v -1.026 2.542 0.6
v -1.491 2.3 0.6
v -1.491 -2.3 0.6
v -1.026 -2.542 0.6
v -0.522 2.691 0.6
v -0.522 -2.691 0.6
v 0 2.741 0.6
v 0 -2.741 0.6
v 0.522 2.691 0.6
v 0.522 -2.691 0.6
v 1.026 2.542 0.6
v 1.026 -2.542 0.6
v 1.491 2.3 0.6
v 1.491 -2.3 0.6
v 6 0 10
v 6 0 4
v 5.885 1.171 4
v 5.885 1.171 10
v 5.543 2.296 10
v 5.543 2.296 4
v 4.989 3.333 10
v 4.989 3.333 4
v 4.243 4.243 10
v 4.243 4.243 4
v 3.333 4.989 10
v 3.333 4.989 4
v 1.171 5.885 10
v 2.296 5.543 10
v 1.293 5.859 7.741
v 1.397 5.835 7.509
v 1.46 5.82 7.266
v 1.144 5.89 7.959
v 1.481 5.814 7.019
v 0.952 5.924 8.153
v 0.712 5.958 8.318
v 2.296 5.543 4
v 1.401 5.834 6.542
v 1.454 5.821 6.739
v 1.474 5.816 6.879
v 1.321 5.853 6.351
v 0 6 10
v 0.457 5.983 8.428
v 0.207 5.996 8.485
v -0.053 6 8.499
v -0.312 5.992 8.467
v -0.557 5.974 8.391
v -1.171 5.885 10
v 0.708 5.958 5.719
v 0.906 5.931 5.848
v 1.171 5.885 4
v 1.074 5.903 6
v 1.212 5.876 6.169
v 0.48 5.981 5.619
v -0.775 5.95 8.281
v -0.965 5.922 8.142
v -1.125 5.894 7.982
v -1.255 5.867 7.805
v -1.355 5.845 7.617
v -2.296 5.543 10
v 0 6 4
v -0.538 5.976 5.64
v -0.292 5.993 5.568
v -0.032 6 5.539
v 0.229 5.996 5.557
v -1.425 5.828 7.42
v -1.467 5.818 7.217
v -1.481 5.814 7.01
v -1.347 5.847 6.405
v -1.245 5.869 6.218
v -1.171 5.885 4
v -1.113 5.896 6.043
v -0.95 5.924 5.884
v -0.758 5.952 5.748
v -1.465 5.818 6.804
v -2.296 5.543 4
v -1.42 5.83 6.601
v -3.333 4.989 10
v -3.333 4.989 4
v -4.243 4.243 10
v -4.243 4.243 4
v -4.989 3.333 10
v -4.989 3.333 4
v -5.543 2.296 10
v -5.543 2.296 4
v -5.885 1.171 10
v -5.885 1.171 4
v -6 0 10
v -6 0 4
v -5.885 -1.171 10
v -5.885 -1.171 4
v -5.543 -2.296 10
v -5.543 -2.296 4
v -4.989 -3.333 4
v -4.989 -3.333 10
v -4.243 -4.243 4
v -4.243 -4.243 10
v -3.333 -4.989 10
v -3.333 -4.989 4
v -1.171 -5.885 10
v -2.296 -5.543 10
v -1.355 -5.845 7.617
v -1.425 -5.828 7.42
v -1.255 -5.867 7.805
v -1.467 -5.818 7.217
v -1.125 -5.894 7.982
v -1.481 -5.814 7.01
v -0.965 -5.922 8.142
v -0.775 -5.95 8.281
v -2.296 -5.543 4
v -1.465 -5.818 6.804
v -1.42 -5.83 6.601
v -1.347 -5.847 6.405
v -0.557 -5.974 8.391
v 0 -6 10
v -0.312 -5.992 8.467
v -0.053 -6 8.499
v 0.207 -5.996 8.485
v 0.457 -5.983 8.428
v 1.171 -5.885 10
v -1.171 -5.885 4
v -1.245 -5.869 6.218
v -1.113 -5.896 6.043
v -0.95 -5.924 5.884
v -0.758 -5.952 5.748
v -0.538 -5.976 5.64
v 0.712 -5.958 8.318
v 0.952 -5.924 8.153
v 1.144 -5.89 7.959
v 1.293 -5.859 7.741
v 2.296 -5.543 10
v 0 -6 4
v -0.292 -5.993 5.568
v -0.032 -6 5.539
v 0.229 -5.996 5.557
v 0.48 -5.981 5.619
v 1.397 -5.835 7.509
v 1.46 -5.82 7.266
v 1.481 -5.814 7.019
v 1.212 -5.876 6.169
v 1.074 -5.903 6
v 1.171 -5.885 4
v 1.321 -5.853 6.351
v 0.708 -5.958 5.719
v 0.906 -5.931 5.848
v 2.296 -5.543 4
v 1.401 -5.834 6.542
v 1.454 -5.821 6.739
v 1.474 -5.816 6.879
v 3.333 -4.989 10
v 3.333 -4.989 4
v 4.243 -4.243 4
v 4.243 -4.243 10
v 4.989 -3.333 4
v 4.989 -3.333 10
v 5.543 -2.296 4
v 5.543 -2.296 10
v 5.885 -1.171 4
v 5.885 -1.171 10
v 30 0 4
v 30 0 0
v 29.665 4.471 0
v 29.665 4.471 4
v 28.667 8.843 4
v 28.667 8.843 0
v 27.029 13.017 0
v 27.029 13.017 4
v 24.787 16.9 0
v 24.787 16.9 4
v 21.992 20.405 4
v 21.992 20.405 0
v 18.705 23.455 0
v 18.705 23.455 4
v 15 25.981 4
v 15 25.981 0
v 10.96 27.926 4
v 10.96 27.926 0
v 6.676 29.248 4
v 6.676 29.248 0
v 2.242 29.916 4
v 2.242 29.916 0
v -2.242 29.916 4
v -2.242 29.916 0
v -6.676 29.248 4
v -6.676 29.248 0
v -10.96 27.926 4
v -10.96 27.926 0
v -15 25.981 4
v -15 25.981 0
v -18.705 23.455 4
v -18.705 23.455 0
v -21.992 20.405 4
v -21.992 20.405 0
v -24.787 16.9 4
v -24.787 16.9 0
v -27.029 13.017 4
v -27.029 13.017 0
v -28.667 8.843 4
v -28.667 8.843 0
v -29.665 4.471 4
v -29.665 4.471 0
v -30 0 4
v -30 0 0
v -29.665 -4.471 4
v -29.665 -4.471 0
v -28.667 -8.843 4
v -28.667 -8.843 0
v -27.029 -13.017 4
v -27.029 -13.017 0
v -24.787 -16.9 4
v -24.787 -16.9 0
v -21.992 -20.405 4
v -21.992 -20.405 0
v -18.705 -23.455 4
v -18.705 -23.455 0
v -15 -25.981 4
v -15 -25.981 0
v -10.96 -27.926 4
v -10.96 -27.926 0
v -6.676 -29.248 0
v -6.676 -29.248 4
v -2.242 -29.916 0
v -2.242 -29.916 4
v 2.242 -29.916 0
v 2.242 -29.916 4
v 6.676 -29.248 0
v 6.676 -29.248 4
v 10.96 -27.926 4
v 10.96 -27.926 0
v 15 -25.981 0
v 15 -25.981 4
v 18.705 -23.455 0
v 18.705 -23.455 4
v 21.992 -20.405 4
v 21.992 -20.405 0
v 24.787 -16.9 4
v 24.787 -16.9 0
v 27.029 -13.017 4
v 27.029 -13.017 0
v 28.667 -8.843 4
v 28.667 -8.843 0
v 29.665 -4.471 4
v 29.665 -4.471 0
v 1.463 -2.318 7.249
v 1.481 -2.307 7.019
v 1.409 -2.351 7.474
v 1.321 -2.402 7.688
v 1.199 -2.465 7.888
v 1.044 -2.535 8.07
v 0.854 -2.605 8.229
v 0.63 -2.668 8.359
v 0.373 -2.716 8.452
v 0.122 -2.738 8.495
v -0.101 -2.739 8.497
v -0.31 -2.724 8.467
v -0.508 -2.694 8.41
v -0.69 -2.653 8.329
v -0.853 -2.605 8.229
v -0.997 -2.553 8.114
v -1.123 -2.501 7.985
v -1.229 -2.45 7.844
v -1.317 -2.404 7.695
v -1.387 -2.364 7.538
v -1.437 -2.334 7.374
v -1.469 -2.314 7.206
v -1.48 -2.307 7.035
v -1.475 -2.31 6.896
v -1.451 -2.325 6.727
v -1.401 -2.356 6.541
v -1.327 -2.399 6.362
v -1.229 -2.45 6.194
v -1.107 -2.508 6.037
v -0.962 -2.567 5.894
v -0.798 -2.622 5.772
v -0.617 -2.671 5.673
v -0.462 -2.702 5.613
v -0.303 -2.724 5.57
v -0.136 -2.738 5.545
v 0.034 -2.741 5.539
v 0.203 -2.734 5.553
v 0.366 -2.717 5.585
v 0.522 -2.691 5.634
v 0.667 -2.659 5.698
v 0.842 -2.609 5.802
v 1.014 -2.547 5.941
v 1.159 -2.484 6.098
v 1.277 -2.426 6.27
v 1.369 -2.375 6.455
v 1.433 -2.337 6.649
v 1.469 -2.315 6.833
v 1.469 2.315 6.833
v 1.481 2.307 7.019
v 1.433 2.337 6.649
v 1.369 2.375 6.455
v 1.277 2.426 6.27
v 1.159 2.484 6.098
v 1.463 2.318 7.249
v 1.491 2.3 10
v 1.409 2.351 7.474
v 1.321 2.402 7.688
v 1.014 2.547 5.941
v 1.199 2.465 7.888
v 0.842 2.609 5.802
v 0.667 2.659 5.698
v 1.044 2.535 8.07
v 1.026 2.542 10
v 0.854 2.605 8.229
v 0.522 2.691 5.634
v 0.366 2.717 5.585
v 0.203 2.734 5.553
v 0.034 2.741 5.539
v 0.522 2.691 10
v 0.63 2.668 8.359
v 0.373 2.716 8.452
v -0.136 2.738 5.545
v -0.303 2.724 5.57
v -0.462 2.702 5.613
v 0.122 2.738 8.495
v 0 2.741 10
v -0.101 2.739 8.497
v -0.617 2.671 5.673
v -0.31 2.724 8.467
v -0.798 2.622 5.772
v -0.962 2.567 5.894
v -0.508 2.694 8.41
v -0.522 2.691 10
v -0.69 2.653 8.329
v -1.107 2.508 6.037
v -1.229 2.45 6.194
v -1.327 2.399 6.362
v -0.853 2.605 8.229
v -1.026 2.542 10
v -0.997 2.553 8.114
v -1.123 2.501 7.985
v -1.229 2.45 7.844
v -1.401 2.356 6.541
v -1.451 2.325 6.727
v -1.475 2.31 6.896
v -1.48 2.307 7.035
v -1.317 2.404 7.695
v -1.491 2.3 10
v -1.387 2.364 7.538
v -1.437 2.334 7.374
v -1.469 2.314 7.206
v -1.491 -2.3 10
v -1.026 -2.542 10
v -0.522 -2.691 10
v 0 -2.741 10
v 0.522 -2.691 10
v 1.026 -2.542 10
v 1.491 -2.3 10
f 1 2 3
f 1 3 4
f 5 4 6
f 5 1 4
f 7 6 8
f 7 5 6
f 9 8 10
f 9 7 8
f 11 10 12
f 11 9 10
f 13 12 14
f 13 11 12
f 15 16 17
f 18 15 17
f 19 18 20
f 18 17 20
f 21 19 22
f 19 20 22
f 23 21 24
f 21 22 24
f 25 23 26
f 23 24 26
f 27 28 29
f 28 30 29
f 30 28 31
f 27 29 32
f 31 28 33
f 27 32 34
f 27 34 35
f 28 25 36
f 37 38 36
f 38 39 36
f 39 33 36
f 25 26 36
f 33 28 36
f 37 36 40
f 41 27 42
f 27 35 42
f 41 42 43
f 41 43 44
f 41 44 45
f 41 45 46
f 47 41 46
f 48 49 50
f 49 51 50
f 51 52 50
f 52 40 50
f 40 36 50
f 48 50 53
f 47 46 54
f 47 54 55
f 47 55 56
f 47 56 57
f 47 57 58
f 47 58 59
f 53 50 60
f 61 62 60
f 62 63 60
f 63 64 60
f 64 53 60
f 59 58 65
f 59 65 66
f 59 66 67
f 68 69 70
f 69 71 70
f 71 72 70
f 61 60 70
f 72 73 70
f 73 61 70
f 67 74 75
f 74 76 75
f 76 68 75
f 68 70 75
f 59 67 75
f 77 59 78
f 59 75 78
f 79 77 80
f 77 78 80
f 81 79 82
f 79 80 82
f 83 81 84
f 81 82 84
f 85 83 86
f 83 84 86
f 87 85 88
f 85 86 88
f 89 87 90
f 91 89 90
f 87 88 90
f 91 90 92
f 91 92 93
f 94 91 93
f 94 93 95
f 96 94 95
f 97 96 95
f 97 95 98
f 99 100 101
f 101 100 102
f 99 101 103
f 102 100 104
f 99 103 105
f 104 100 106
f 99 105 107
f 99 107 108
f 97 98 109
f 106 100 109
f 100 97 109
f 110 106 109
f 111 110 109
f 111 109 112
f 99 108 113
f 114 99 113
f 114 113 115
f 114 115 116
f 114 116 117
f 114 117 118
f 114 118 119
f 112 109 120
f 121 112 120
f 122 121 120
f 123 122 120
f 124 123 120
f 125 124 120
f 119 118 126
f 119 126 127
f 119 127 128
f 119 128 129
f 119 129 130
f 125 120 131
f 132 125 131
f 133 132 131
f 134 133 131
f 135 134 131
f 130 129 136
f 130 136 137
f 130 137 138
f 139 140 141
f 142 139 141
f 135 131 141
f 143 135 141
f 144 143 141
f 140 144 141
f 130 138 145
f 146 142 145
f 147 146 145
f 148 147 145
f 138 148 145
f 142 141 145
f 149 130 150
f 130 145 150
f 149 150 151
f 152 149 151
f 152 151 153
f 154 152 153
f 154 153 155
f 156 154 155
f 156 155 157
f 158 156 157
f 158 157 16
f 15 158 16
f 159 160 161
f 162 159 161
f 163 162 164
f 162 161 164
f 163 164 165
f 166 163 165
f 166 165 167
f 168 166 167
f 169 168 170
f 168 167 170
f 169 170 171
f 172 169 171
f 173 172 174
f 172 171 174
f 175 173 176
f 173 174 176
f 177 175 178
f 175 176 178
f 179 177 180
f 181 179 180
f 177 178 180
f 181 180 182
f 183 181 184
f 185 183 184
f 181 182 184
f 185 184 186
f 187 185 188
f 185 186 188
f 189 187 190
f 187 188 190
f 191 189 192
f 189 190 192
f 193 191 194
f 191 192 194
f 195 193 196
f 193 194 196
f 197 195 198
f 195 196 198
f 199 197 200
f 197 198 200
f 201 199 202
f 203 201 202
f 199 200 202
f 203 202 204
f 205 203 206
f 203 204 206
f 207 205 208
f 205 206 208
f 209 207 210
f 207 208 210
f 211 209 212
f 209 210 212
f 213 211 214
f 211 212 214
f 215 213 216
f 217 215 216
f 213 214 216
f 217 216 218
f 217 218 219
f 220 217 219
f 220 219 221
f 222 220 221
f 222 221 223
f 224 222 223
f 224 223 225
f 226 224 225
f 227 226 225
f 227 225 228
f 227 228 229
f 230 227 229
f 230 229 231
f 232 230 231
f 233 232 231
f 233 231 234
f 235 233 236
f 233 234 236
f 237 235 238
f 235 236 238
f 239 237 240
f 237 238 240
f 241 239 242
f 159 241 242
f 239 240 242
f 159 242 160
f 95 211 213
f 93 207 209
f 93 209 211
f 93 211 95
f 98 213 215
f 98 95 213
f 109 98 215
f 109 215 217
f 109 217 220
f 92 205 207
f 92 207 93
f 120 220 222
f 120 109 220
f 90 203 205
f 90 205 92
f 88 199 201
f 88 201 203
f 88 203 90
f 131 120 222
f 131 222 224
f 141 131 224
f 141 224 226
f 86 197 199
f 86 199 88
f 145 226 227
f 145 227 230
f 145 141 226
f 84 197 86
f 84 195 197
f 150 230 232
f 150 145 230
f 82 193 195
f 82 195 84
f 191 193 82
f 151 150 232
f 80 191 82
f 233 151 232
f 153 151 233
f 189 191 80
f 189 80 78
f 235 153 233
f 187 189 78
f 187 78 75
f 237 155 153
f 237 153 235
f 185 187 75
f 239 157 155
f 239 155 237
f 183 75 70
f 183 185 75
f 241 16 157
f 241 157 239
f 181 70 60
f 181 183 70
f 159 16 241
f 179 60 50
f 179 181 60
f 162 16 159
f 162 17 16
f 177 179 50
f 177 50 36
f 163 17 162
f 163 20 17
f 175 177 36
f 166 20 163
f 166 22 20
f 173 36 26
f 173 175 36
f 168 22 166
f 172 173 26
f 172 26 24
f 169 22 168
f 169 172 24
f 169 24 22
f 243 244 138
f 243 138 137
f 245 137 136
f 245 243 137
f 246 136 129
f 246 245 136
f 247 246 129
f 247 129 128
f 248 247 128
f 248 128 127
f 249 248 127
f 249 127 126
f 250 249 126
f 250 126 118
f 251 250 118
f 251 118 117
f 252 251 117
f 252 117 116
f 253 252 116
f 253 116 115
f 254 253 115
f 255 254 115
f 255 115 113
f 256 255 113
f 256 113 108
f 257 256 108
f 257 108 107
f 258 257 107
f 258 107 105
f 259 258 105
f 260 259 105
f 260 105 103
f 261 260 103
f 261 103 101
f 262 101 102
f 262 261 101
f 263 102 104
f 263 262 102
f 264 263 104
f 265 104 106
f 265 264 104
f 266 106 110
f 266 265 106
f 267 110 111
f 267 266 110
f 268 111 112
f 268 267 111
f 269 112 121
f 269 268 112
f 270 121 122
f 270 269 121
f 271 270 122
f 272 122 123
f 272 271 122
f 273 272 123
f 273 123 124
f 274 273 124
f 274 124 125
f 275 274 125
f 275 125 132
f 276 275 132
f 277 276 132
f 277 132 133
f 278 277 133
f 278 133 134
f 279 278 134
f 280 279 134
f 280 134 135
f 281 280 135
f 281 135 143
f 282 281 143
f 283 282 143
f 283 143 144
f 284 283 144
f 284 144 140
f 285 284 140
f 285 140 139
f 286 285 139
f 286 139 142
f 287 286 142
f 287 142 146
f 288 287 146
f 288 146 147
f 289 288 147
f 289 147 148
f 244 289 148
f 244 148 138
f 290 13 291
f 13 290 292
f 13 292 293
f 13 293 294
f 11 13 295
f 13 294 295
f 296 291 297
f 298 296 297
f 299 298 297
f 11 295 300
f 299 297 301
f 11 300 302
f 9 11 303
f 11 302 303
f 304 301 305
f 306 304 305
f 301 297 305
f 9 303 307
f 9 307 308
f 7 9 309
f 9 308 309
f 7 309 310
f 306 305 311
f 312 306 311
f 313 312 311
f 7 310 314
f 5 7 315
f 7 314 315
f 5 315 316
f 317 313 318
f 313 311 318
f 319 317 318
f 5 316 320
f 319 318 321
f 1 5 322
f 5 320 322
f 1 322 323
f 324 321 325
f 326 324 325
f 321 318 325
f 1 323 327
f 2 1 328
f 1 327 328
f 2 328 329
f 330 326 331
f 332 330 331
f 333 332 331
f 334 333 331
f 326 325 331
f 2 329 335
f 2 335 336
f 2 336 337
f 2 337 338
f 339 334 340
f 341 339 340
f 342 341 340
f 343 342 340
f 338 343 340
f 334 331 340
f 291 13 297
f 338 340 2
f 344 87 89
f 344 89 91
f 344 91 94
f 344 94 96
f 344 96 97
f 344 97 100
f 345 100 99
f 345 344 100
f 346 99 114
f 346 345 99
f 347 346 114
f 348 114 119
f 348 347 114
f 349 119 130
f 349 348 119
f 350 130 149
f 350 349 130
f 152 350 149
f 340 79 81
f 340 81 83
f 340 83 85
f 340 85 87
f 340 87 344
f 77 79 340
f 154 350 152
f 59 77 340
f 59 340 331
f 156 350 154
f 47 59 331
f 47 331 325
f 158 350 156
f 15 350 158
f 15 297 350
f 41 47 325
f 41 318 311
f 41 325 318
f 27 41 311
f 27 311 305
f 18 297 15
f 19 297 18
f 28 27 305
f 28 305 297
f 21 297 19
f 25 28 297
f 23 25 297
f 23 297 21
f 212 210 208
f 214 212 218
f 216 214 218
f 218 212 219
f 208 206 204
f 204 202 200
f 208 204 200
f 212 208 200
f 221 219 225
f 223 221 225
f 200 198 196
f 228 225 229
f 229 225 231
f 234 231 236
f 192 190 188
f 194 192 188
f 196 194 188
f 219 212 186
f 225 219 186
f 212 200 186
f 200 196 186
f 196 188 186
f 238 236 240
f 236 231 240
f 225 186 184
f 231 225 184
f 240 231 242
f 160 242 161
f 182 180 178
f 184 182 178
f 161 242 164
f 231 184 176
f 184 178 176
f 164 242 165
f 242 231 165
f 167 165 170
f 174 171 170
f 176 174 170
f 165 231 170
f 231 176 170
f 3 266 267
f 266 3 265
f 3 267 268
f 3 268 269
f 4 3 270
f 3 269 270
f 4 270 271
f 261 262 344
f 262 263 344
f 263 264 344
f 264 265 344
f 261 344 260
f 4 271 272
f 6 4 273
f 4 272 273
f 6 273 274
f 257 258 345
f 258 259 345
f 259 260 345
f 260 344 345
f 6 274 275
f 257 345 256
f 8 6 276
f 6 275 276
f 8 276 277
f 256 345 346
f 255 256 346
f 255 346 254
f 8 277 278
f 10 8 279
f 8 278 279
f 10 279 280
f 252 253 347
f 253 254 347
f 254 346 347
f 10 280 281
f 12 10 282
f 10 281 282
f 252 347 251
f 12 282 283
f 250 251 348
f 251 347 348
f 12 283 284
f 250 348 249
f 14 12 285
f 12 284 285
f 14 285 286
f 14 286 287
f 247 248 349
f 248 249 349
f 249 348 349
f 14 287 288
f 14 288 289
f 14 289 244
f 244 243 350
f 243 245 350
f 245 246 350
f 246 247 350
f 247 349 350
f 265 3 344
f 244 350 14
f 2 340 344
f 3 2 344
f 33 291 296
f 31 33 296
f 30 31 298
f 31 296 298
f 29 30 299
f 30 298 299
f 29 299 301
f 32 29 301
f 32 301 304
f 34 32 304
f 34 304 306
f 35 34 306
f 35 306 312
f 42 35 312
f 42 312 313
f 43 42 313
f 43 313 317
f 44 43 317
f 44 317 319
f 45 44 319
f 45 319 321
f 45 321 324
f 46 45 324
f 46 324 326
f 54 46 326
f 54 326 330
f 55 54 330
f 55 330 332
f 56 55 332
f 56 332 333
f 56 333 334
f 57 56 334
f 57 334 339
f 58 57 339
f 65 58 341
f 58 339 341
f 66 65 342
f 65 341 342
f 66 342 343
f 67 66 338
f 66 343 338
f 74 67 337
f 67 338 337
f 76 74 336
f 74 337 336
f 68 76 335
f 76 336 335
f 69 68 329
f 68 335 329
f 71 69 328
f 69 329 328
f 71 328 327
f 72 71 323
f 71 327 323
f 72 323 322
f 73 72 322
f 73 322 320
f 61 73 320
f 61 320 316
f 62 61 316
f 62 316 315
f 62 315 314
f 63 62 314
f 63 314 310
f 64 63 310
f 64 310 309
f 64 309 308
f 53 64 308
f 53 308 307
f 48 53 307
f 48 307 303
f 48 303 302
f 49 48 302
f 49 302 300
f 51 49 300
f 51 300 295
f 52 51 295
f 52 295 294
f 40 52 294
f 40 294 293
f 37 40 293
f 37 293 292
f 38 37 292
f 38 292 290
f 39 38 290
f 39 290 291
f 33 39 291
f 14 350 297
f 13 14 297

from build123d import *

# Parameters (mm, degrees)
F0_R          = 30
F1_DEPTH      = 4
F2_R          = 6
F3_DEPTH      = 10
F4_R          = 1.480547
F5_DEPTH      = 25
F5_DEPTH_BACK = 25
F7_DEPTH      = 9.4


with BuildPart() as f1:
    # F0 (on Top) → F1 (new body)
    with BuildSketch(Plane.XY):
        Circle(F0_R)
    extrude(amount=F1_DEPTH)

    # F2 (on Top) → F3 (join)
    with BuildSketch(Plane.XY):
        Circle(F2_R)
    extrude(amount=F3_DEPTH)

    # F4 (on Front) → F5 (cut, two sides)
    with BuildSketch(Plane.XZ) as f5_sk:
        with Locations((0, 7.019453)):
            Circle(F4_R)
    extrude(amount=F5_DEPTH, mode=Mode.SUBTRACT)
    extrude(f5_sk.sketch, amount=-F5_DEPTH_BACK, mode=Mode.SUBTRACT)

    # F6 (on face) → F7 (cut)
    with BuildSketch(Plane.XY.offset(10)):
        with BuildLine():
            Line((-1.491322, 2.3), (-1.491322, -2.3))
            ThreePointArc((-1.491322, -2.3), (0, -2.741175), (1.491322, -2.3))
            Line((1.491322, -2.3), (1.491322, 2.3))
            ThreePointArc((1.491322, 2.3), (0, 2.741175), (-1.491322, 2.3))
        make_face()
    extrude(amount=-F7_DEPTH, mode=Mode.SUBTRACT)


solid = f1.part
